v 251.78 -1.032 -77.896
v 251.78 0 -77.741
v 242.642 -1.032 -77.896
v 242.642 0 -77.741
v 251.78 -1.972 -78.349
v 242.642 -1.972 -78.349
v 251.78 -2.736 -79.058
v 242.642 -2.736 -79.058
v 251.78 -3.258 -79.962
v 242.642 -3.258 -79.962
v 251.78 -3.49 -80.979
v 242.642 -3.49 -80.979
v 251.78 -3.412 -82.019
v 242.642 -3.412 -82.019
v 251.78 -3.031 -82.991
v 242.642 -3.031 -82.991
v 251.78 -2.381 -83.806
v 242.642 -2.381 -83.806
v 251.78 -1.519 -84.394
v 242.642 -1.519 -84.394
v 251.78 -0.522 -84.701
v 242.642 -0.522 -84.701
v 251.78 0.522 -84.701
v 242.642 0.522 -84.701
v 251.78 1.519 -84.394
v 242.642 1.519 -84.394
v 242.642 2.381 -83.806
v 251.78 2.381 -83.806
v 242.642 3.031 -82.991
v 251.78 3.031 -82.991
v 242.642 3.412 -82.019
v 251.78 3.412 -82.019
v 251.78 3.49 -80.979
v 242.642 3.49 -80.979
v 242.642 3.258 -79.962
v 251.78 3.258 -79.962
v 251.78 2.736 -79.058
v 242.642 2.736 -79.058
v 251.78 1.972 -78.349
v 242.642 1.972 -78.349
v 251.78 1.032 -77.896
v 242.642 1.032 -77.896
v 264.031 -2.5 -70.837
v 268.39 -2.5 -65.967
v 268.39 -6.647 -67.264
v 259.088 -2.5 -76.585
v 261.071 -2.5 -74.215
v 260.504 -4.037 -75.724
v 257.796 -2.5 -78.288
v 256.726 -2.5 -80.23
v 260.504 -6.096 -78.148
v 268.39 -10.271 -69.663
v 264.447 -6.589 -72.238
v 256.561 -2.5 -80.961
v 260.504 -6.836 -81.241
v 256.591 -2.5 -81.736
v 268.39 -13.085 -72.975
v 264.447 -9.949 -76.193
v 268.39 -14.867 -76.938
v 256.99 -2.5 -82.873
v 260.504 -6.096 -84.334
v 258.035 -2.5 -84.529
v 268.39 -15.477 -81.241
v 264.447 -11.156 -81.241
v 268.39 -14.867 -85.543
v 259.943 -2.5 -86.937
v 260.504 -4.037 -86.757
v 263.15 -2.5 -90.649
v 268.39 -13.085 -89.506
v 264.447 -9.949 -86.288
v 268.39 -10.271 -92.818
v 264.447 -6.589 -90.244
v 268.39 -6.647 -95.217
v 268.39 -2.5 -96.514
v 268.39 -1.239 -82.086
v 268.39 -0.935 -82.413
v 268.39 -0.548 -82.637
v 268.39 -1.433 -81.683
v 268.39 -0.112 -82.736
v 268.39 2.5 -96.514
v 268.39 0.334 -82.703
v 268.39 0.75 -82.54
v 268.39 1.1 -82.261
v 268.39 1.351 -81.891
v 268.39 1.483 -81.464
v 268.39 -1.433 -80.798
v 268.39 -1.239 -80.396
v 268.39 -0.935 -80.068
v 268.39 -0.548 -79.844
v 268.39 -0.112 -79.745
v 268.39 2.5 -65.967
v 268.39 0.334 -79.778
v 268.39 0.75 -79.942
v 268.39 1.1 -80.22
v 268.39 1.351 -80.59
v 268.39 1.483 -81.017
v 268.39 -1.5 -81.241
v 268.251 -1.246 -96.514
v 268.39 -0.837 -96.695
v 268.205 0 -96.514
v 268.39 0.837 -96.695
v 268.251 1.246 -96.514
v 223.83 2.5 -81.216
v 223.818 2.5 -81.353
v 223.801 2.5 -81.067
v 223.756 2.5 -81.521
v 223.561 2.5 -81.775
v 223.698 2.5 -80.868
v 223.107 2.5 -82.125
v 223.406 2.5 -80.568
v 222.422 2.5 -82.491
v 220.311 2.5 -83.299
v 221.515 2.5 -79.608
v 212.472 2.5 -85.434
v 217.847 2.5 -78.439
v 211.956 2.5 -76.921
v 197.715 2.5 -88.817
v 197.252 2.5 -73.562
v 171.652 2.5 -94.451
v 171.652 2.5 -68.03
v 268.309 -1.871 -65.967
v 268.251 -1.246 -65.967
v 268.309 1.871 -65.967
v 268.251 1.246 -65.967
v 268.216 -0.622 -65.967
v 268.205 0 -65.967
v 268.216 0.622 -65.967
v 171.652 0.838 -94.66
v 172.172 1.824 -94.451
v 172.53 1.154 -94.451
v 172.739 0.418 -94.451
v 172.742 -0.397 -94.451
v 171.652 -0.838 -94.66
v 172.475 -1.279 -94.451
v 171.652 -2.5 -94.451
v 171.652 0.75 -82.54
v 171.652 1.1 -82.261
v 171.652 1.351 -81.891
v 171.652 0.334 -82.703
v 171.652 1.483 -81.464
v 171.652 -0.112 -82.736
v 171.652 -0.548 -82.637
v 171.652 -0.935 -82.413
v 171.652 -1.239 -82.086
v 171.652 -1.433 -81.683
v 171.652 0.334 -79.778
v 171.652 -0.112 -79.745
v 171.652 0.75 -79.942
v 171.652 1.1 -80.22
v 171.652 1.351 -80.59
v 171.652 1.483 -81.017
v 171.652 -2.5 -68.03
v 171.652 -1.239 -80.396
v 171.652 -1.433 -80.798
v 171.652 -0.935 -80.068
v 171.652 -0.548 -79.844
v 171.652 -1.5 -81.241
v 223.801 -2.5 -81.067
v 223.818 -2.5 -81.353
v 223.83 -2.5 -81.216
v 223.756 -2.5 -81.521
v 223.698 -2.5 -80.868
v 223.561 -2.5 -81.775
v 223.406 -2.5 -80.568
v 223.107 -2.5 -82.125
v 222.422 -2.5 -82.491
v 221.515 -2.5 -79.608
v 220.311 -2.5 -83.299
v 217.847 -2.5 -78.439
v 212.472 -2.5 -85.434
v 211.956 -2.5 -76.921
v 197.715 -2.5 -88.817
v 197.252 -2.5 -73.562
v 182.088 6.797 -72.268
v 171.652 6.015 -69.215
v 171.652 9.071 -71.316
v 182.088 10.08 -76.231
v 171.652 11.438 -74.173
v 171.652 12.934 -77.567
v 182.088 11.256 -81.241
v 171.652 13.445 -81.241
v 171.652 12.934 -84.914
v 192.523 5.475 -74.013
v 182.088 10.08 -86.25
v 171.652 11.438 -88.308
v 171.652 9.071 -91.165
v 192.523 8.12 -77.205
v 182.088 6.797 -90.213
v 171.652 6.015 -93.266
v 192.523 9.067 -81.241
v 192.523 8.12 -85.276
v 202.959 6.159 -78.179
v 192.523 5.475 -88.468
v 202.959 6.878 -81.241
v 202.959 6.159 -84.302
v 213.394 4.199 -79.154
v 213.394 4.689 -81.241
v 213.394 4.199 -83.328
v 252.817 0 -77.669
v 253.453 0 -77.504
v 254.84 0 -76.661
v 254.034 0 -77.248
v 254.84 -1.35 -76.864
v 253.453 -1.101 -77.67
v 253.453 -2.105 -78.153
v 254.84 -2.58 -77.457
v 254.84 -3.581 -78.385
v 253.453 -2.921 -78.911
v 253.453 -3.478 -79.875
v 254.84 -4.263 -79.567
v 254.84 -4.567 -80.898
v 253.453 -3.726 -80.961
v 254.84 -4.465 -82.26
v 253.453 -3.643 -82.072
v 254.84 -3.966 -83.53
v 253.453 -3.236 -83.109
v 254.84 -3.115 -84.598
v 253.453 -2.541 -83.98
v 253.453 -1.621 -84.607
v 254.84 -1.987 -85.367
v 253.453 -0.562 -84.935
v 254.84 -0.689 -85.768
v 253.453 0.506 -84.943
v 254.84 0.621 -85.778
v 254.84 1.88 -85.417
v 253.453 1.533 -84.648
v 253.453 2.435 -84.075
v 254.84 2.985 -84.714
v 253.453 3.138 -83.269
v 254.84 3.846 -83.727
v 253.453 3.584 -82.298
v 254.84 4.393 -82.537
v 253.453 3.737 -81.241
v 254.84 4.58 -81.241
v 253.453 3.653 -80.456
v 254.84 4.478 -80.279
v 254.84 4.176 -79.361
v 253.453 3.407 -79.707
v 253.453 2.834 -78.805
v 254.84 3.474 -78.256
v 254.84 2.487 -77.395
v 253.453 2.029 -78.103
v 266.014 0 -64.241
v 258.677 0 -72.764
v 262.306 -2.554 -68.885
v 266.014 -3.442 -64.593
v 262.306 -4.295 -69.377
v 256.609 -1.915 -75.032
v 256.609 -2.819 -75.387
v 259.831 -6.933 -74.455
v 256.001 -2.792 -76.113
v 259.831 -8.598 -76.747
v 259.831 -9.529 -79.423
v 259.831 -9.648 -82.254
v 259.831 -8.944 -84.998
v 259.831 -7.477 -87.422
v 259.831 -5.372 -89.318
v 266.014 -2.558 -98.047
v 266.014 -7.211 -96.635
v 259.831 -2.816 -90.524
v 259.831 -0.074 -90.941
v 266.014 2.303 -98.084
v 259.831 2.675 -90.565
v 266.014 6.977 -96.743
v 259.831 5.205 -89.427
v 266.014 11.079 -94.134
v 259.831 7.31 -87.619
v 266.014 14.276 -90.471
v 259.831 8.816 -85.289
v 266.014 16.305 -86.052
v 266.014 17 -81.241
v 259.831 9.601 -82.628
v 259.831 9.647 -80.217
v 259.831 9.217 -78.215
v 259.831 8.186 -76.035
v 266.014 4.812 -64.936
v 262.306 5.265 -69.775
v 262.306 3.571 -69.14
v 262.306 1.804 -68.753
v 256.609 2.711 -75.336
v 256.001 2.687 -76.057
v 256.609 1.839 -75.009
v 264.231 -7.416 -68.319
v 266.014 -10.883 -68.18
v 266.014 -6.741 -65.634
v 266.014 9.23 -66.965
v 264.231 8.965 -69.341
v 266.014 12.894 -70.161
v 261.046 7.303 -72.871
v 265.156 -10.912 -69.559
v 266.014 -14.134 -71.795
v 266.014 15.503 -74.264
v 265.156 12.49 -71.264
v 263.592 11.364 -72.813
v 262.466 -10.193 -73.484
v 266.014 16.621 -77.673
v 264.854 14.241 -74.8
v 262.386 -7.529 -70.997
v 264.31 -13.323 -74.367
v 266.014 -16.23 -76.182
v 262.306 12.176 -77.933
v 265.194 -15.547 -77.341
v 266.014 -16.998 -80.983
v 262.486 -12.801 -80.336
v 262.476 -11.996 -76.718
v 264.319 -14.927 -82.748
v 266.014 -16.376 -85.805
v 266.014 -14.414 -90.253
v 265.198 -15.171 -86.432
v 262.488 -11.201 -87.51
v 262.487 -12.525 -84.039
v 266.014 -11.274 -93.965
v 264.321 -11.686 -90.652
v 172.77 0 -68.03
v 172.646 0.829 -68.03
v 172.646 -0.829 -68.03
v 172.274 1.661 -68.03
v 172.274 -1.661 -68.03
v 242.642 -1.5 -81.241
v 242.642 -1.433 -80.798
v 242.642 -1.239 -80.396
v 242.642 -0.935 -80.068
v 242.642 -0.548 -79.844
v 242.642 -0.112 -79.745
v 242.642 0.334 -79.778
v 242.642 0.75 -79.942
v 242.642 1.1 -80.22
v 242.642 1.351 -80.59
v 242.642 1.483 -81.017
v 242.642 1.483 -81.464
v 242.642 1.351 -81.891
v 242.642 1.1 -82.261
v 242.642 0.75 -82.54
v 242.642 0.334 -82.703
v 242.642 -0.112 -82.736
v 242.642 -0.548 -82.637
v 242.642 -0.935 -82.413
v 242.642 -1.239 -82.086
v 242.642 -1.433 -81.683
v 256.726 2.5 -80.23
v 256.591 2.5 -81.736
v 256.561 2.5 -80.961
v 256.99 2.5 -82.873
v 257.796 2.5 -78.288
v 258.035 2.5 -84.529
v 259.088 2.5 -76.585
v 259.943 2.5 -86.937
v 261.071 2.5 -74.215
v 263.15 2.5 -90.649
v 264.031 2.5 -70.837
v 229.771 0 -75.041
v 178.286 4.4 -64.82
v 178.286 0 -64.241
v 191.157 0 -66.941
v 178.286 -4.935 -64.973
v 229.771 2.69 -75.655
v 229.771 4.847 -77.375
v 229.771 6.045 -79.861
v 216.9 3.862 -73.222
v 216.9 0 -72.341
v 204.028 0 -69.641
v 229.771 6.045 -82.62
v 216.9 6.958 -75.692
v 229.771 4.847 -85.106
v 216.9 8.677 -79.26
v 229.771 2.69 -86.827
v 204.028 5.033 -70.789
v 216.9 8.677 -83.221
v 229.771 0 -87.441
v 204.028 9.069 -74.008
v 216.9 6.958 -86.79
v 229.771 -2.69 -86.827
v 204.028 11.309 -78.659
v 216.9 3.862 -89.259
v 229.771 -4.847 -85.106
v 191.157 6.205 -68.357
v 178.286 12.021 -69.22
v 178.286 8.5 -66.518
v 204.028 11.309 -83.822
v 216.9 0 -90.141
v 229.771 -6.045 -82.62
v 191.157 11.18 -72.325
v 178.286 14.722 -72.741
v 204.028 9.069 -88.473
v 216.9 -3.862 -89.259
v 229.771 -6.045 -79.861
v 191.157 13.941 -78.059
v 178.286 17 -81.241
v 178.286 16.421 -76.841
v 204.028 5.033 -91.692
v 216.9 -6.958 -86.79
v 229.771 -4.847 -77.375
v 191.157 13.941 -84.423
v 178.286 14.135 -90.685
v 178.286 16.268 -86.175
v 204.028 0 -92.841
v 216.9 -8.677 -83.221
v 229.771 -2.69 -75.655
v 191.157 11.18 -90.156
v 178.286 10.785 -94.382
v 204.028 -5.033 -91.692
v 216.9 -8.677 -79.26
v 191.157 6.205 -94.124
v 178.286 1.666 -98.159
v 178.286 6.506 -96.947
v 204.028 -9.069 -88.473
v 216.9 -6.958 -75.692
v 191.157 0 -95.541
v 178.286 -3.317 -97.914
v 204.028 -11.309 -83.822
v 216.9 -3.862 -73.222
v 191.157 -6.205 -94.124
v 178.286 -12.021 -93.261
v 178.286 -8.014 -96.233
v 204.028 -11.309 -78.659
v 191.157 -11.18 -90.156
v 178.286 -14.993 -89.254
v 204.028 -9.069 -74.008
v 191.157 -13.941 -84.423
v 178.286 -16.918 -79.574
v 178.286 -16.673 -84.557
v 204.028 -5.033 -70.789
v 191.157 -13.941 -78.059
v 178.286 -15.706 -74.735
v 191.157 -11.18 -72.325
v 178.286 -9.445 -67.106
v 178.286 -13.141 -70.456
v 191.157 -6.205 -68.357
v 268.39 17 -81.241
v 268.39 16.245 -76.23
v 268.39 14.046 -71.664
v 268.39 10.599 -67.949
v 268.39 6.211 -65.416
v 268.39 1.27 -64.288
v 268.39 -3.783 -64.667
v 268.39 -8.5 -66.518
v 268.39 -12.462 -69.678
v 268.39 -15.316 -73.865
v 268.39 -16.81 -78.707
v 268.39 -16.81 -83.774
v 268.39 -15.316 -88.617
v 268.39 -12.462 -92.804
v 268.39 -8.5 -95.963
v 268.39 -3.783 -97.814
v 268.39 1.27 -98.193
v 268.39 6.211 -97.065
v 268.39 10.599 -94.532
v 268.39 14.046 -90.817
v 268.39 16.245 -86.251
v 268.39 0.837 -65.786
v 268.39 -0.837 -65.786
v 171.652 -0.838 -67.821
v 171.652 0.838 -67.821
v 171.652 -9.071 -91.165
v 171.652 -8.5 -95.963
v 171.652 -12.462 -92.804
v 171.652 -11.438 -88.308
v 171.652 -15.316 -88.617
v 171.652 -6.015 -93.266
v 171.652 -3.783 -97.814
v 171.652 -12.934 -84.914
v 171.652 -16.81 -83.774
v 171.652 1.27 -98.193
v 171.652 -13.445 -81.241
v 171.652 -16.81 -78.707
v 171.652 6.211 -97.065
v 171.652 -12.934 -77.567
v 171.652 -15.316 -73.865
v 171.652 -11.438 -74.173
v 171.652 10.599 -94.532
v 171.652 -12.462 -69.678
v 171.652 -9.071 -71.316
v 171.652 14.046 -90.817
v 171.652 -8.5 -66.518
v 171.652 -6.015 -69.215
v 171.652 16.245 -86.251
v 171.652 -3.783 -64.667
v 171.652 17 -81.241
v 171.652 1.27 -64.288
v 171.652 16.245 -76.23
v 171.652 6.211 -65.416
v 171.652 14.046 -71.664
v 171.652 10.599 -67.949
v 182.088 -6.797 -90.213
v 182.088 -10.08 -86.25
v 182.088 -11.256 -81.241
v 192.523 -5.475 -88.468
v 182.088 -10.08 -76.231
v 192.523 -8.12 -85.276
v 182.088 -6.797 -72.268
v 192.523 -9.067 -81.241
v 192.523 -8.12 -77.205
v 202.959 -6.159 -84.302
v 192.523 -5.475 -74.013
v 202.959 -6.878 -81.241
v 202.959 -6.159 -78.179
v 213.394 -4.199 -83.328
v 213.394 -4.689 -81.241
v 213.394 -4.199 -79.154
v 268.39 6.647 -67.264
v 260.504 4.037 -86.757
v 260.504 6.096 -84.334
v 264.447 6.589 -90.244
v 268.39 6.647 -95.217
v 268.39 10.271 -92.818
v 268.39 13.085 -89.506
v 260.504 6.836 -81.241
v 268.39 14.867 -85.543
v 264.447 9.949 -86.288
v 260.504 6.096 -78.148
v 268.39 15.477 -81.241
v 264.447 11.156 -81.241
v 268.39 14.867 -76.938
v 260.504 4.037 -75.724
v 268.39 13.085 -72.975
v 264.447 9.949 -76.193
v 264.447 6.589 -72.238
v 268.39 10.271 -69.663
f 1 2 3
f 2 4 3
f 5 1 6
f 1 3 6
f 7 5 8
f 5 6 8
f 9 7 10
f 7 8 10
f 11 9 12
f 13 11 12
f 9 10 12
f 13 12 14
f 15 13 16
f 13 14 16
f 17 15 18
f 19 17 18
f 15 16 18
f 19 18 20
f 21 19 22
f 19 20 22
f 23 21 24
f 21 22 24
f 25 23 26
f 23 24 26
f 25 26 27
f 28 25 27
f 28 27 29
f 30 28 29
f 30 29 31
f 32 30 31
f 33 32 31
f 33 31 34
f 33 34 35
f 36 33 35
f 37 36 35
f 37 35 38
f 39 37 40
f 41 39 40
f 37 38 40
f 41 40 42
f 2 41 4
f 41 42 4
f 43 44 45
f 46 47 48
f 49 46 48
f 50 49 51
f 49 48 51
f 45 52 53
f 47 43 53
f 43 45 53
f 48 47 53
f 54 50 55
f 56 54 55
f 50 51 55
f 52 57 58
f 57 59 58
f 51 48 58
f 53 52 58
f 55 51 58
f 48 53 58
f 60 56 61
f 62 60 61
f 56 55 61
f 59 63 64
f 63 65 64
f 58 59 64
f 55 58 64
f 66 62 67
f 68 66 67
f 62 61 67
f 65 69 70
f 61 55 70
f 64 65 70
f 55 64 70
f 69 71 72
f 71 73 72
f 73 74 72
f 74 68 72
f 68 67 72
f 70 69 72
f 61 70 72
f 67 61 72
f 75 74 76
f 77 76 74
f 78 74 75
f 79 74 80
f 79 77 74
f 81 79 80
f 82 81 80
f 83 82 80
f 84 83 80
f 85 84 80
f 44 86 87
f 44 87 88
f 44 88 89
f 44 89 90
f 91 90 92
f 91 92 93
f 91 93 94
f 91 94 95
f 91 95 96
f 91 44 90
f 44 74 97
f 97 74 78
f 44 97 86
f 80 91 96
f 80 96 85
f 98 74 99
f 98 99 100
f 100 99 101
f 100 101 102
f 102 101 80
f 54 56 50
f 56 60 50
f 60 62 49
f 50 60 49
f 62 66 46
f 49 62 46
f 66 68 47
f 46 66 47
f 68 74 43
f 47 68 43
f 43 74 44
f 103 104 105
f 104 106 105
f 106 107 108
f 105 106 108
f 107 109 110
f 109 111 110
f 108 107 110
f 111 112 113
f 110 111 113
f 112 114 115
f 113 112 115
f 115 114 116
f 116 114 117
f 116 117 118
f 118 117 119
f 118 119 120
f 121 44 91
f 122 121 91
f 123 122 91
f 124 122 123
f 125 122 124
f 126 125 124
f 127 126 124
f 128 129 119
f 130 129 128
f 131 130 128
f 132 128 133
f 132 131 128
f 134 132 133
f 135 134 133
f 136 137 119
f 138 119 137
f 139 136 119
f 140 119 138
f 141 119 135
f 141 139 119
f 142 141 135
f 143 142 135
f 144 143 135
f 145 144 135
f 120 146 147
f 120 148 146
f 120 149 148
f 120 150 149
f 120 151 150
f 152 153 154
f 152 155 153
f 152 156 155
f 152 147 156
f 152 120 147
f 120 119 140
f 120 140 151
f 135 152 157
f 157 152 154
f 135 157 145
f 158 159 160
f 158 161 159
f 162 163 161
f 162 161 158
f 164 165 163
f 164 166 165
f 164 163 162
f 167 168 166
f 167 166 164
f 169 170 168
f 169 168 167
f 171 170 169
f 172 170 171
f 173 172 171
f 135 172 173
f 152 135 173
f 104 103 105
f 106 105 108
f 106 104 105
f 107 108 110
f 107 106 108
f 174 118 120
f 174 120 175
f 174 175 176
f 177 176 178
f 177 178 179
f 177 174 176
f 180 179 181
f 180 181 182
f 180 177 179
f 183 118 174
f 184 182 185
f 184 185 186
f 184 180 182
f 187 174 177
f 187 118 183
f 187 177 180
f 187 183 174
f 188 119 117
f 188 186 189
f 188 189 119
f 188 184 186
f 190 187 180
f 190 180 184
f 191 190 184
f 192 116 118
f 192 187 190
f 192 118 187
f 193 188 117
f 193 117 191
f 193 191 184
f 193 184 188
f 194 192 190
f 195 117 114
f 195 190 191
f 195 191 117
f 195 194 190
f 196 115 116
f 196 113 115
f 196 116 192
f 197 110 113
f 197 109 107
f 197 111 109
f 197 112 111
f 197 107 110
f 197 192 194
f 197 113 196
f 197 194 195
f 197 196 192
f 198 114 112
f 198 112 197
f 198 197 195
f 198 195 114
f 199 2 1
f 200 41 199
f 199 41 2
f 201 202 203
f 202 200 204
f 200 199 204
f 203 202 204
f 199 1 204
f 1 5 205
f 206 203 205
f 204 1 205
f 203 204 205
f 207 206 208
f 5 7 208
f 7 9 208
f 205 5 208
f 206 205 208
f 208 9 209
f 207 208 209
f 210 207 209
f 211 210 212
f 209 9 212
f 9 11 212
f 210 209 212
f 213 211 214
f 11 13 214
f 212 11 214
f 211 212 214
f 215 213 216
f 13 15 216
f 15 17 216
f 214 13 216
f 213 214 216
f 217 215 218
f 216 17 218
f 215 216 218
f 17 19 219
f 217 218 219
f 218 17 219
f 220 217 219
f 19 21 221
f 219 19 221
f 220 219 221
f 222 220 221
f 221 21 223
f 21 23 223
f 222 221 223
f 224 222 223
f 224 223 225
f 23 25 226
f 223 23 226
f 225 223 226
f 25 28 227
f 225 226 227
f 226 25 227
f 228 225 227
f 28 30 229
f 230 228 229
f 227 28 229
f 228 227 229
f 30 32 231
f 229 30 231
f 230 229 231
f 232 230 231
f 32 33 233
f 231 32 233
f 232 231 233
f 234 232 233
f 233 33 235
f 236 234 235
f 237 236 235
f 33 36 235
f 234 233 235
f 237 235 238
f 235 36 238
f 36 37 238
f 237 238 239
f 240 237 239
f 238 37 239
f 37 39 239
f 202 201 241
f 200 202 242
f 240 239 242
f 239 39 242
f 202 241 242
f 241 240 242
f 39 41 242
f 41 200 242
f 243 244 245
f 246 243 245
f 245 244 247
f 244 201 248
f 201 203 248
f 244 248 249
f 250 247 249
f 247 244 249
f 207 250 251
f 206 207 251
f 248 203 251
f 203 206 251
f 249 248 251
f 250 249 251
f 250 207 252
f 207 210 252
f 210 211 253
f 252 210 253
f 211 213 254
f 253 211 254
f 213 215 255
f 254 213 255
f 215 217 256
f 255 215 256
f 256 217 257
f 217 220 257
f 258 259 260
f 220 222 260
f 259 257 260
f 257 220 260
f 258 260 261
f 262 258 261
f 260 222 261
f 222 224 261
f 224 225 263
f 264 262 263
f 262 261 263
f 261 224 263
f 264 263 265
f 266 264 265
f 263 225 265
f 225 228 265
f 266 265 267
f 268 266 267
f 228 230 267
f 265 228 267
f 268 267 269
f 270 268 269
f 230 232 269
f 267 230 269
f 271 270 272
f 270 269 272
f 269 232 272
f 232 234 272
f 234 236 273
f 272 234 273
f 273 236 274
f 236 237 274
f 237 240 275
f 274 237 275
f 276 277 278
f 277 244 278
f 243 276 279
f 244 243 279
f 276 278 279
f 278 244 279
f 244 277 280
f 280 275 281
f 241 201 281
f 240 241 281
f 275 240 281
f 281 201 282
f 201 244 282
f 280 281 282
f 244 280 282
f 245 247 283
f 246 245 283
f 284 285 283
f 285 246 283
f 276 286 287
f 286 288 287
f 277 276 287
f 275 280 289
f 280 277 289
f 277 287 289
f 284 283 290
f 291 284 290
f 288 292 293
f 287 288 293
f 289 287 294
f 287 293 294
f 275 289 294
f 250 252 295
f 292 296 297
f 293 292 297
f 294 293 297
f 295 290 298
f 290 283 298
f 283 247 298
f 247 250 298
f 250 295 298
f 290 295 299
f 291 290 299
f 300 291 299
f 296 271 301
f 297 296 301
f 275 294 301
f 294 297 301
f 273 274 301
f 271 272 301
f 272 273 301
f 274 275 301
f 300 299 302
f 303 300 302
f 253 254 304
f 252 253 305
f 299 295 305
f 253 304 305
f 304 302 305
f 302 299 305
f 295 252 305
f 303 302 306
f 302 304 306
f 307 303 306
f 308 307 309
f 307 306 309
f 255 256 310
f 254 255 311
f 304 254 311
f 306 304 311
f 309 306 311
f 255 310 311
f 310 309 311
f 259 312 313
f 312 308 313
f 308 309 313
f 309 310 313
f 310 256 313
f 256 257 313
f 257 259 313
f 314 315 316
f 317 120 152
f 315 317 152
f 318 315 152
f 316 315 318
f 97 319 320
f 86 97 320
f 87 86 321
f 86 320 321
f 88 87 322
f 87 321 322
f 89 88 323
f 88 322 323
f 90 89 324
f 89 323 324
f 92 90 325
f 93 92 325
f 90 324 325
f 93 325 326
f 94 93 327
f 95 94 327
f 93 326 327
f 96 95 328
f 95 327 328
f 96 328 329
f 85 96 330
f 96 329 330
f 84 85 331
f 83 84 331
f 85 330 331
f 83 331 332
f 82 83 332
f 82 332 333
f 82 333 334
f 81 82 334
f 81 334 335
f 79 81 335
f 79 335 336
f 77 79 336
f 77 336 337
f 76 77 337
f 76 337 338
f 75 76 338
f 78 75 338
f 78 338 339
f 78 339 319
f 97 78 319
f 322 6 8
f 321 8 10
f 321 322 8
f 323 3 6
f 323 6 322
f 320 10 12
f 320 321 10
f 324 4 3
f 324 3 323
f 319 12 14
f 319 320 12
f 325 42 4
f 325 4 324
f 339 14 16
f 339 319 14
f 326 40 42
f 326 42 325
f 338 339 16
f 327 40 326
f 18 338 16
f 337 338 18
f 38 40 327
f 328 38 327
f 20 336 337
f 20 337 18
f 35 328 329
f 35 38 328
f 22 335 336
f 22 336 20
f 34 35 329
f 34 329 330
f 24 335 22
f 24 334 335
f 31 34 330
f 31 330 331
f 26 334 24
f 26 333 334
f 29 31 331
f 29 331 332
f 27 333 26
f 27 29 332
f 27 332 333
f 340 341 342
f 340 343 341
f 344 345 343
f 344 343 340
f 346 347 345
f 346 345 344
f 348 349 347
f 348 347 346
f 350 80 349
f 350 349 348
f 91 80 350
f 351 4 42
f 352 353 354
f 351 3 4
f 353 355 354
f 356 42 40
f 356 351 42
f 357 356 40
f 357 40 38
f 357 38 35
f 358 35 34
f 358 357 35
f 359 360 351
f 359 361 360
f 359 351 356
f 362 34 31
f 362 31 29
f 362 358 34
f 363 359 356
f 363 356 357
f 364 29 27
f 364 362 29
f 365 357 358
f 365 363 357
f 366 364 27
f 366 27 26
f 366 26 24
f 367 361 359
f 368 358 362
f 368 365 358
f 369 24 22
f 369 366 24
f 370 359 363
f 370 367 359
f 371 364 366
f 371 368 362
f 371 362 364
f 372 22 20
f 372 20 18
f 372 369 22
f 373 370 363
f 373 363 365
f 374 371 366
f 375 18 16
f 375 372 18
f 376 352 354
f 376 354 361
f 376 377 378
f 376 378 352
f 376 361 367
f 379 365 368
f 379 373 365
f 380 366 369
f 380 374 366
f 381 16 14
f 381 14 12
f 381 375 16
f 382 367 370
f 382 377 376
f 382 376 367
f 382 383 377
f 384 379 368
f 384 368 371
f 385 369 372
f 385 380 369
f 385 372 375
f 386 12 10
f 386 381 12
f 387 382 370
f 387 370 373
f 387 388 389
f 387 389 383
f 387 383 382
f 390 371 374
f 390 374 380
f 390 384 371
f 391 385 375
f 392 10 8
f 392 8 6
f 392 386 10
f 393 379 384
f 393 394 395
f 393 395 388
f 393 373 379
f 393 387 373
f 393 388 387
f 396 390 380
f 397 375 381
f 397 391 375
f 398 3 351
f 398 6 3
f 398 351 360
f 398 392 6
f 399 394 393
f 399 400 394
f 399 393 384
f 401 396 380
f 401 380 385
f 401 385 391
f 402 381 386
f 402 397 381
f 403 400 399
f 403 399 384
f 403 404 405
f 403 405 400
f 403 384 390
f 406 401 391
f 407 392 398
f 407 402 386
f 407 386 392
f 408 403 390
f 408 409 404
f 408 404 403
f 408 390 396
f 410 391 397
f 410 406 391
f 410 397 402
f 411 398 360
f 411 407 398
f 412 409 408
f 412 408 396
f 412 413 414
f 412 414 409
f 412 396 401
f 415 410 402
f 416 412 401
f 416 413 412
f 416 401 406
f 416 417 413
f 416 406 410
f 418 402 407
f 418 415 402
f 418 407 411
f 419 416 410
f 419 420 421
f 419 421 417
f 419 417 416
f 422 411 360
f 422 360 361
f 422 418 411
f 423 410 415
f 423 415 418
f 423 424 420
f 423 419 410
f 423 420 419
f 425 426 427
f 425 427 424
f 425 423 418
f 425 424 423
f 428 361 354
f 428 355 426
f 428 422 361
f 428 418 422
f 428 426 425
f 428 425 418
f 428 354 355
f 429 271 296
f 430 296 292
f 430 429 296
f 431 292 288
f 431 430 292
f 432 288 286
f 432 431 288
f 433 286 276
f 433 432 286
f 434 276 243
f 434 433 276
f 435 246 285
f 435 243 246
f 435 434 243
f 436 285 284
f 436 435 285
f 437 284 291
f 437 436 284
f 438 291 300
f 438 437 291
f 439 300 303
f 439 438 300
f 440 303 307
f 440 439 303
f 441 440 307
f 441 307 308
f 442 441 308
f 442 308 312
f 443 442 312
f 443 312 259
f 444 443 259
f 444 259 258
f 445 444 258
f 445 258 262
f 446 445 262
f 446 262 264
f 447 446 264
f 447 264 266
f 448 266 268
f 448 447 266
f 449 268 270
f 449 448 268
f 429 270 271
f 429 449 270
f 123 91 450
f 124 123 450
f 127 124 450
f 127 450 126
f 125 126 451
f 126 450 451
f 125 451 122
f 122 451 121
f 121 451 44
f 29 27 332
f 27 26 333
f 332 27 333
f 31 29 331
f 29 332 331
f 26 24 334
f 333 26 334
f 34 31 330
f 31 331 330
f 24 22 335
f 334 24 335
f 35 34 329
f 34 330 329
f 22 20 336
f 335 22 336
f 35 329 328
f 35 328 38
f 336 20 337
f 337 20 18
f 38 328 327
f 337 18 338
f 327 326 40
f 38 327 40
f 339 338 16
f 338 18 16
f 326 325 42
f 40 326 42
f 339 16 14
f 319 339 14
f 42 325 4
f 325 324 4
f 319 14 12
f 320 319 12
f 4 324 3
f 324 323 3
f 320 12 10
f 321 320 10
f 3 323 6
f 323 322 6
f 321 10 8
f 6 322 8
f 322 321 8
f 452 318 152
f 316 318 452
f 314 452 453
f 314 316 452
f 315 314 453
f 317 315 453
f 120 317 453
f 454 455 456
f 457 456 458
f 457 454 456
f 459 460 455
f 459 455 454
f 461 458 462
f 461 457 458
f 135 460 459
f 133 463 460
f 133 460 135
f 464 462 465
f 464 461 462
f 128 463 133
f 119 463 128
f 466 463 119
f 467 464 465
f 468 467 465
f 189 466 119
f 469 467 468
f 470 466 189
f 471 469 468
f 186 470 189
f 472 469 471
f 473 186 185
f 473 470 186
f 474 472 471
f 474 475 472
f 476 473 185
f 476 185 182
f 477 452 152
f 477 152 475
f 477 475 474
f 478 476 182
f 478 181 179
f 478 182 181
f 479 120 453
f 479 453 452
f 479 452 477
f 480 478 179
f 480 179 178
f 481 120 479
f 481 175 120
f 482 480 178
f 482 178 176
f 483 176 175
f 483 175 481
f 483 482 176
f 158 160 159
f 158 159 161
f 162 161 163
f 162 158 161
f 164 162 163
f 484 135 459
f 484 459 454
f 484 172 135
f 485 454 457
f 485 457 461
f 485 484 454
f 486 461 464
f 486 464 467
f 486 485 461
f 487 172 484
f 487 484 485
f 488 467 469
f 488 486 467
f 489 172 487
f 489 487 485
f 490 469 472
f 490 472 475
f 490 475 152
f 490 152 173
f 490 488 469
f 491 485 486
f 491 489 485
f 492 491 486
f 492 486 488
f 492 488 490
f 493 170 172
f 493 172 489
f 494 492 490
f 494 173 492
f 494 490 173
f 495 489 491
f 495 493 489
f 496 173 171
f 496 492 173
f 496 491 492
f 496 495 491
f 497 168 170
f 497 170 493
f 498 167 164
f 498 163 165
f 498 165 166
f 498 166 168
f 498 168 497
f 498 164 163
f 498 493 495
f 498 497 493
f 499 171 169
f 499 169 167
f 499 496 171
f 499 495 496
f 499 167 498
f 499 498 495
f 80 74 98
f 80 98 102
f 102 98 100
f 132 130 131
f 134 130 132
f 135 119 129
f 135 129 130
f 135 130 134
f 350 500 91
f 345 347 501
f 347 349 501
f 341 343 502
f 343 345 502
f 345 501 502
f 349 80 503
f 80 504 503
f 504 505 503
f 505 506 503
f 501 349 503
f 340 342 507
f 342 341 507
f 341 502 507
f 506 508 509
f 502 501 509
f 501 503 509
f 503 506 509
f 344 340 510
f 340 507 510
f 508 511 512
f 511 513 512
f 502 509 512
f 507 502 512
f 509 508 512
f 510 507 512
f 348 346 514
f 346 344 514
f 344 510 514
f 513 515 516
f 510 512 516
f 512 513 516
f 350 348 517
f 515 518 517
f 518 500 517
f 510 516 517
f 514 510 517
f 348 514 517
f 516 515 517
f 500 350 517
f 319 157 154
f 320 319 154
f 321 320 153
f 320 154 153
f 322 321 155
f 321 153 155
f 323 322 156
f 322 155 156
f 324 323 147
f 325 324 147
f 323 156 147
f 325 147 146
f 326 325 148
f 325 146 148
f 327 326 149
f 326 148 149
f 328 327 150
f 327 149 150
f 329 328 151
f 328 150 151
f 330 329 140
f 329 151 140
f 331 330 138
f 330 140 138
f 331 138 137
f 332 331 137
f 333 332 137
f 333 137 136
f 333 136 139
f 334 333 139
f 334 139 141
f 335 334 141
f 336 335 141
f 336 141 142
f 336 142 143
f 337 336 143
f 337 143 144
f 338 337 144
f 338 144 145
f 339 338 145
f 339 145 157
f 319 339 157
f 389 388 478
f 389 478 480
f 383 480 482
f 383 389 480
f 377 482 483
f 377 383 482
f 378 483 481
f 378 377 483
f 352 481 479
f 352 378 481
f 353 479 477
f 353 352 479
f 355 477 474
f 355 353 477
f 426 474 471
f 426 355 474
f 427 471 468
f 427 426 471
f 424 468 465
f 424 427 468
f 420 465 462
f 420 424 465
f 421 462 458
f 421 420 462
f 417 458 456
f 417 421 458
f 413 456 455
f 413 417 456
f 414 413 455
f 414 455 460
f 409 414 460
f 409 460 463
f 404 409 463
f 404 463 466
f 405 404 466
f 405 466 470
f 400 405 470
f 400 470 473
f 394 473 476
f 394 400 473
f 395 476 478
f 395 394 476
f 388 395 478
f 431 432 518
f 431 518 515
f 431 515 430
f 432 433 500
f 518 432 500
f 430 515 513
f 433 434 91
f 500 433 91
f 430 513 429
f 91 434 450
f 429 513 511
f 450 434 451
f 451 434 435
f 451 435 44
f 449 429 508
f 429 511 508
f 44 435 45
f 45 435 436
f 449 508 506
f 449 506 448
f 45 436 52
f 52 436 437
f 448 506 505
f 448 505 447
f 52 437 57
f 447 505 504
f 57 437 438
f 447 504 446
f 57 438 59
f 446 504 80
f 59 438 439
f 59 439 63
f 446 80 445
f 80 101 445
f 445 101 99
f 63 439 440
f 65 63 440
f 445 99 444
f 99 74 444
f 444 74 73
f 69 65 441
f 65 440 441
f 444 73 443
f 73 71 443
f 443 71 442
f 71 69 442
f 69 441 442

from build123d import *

# Parameters (mm, degrees)
F4_W      = 5
F4_H      = 30.5469320461
F6_W      = 5
F6_H      = 26.4217317555
F8_R      = 1.5
F9_DEPTH  = 96.7388454146
F10_R     = 1.5
F11_DEPTH = 96.7388453146
F12_R     = 26.7019871491
F12_R_2   = 17
F13_DEPTH = 96.7388453146


with BuildPart() as f1:
    # F0 (on Front) → F1 (revolve)
    with BuildSketch(Plane.XZ):
        with BuildLine():
            Line((268.3902070652, -65.7638534904), (268.3902070652, -61.2405703372))
            add(Edge.make_bspline(
                [(268.3902070652, -61.2405703372), (267.8550149212, -61.94707859), (266.5621733522, -63.6537635506), (262.7827235281, -67.9883815252), (259.1049731221, -72.5520199027), (256.3829698169, -74.7943444767), (254.6676374758, -77.1066096601), (252.8988280895, -77.730971982), (252.1214837272, -77.7382459282), (251.7798841, -77.7405703372)],
                knots=[0, 0, 0, 0, 0.1367464843, 0.3303309199, 0.5265232792, 0.6771480714, 0.8105734062, 0.9167648438, 1, 1, 1, 1], degree=3))
            Line((251.7798841, -77.7405703372), (242.6421940327, -77.7405703372))
            Line((242.6421940327, -77.7405703372), (242.6421940327, -81.2405703372))
            Line((242.6421940327, -81.2405703372), (254.264831543, -81.2405703372))
            Line((254.264831543, -81.2405703372), (268.3902070652, -65.7638534904))
        make_face()
    revolve(axis=Axis((248.4535127878, 0, -81.2405703372), (1, 0, 0)))

    # F4 (on face) → F5 (join, up to the next surface of F1)
    with BuildSketch(Plane.YZ.offset(268.3902070652)):
        with Locations((0, -81.2405703372)):
            Rectangle(F4_W, F4_H)
    extrude(until=Until.NEXT, dir=(-1, 0, 0))


with BuildPart() as f3:
    # F2 (on Front) → F3 (revolve)
    with BuildSketch(Plane.XZ):
        Polygon((242.6421940327, -77.7405703372), (171.6523617506, -62.8490278429), (171.6523617506, -67.7952374205), (235.7479333878, -81.2405703372), (242.6421940327, -81.2405703372), align=None)
    revolve(axis=Axis((239.1950637102, 0, -81.2405703372), (-1, 0, 0)))

    # F6 (on face) → F7 (join, up to the next surface of F3)
    with BuildSketch(Plane(origin=(171.6523617506, 0, 0), x_dir=(0, -1, 0), z_dir=(-1, 0, 0))):
        with Locations((0, -81.2405703372)):
            Rectangle(F6_W, F6_H)
    extrude(until=Until.NEXT, dir=(1, 0, 0))


with BuildPart() as f9_tool:
    # F8 (on face) → F9 (new body, through all)
    with BuildSketch(Plane(origin=(171.6523617506, 0, 0), x_dir=(0, -1, 0), z_dir=(-1, 0, 0))):
        with Locations((0, -81.2405703372)):
            Circle(F8_R)
    extrude(amount=-F9_DEPTH)


with BuildPart() as f1_1:
    add(f1.part)

    # F9: cut by f9_tool
    add(f9_tool.part, mode=Mode.SUBTRACT)

    # F10 (on face) → F11 (cut, through all)
    with BuildSketch(Plane.YZ.offset(268.3902070652)):
        with Locations((0, -81.2405703372)):
            Circle(F10_R)
    extrude(amount=-F11_DEPTH, mode=Mode.SUBTRACT)


with BuildPart() as f3_1:
    add(f3.part)

    # F9: cut by f9_tool
    add(f9_tool.part, mode=Mode.SUBTRACT)


with BuildPart() as f13_tool:
    # F12 (on face) → F13 (new body, through all)
    with BuildSketch(Plane.YZ.offset(268.3902070652)):
        with Locations((0, -81.2405703372)):
            Circle(F12_R)
        with Locations((0, -81.2405703372)):
            Circle(F12_R_2, mode=Mode.SUBTRACT)
    extrude(amount=-F13_DEPTH)


with BuildPart() as f1_2:
    add(f1_1.part)

    # F13: cut by f13_tool
    add(f13_tool.part, mode=Mode.SUBTRACT)


with BuildPart() as f3_2:
    add(f3_1.part)

    # F13: cut by f13_tool
    add(f13_tool.part, mode=Mode.SUBTRACT)


solid = Compound([f1_2.part, f3_2.part])
